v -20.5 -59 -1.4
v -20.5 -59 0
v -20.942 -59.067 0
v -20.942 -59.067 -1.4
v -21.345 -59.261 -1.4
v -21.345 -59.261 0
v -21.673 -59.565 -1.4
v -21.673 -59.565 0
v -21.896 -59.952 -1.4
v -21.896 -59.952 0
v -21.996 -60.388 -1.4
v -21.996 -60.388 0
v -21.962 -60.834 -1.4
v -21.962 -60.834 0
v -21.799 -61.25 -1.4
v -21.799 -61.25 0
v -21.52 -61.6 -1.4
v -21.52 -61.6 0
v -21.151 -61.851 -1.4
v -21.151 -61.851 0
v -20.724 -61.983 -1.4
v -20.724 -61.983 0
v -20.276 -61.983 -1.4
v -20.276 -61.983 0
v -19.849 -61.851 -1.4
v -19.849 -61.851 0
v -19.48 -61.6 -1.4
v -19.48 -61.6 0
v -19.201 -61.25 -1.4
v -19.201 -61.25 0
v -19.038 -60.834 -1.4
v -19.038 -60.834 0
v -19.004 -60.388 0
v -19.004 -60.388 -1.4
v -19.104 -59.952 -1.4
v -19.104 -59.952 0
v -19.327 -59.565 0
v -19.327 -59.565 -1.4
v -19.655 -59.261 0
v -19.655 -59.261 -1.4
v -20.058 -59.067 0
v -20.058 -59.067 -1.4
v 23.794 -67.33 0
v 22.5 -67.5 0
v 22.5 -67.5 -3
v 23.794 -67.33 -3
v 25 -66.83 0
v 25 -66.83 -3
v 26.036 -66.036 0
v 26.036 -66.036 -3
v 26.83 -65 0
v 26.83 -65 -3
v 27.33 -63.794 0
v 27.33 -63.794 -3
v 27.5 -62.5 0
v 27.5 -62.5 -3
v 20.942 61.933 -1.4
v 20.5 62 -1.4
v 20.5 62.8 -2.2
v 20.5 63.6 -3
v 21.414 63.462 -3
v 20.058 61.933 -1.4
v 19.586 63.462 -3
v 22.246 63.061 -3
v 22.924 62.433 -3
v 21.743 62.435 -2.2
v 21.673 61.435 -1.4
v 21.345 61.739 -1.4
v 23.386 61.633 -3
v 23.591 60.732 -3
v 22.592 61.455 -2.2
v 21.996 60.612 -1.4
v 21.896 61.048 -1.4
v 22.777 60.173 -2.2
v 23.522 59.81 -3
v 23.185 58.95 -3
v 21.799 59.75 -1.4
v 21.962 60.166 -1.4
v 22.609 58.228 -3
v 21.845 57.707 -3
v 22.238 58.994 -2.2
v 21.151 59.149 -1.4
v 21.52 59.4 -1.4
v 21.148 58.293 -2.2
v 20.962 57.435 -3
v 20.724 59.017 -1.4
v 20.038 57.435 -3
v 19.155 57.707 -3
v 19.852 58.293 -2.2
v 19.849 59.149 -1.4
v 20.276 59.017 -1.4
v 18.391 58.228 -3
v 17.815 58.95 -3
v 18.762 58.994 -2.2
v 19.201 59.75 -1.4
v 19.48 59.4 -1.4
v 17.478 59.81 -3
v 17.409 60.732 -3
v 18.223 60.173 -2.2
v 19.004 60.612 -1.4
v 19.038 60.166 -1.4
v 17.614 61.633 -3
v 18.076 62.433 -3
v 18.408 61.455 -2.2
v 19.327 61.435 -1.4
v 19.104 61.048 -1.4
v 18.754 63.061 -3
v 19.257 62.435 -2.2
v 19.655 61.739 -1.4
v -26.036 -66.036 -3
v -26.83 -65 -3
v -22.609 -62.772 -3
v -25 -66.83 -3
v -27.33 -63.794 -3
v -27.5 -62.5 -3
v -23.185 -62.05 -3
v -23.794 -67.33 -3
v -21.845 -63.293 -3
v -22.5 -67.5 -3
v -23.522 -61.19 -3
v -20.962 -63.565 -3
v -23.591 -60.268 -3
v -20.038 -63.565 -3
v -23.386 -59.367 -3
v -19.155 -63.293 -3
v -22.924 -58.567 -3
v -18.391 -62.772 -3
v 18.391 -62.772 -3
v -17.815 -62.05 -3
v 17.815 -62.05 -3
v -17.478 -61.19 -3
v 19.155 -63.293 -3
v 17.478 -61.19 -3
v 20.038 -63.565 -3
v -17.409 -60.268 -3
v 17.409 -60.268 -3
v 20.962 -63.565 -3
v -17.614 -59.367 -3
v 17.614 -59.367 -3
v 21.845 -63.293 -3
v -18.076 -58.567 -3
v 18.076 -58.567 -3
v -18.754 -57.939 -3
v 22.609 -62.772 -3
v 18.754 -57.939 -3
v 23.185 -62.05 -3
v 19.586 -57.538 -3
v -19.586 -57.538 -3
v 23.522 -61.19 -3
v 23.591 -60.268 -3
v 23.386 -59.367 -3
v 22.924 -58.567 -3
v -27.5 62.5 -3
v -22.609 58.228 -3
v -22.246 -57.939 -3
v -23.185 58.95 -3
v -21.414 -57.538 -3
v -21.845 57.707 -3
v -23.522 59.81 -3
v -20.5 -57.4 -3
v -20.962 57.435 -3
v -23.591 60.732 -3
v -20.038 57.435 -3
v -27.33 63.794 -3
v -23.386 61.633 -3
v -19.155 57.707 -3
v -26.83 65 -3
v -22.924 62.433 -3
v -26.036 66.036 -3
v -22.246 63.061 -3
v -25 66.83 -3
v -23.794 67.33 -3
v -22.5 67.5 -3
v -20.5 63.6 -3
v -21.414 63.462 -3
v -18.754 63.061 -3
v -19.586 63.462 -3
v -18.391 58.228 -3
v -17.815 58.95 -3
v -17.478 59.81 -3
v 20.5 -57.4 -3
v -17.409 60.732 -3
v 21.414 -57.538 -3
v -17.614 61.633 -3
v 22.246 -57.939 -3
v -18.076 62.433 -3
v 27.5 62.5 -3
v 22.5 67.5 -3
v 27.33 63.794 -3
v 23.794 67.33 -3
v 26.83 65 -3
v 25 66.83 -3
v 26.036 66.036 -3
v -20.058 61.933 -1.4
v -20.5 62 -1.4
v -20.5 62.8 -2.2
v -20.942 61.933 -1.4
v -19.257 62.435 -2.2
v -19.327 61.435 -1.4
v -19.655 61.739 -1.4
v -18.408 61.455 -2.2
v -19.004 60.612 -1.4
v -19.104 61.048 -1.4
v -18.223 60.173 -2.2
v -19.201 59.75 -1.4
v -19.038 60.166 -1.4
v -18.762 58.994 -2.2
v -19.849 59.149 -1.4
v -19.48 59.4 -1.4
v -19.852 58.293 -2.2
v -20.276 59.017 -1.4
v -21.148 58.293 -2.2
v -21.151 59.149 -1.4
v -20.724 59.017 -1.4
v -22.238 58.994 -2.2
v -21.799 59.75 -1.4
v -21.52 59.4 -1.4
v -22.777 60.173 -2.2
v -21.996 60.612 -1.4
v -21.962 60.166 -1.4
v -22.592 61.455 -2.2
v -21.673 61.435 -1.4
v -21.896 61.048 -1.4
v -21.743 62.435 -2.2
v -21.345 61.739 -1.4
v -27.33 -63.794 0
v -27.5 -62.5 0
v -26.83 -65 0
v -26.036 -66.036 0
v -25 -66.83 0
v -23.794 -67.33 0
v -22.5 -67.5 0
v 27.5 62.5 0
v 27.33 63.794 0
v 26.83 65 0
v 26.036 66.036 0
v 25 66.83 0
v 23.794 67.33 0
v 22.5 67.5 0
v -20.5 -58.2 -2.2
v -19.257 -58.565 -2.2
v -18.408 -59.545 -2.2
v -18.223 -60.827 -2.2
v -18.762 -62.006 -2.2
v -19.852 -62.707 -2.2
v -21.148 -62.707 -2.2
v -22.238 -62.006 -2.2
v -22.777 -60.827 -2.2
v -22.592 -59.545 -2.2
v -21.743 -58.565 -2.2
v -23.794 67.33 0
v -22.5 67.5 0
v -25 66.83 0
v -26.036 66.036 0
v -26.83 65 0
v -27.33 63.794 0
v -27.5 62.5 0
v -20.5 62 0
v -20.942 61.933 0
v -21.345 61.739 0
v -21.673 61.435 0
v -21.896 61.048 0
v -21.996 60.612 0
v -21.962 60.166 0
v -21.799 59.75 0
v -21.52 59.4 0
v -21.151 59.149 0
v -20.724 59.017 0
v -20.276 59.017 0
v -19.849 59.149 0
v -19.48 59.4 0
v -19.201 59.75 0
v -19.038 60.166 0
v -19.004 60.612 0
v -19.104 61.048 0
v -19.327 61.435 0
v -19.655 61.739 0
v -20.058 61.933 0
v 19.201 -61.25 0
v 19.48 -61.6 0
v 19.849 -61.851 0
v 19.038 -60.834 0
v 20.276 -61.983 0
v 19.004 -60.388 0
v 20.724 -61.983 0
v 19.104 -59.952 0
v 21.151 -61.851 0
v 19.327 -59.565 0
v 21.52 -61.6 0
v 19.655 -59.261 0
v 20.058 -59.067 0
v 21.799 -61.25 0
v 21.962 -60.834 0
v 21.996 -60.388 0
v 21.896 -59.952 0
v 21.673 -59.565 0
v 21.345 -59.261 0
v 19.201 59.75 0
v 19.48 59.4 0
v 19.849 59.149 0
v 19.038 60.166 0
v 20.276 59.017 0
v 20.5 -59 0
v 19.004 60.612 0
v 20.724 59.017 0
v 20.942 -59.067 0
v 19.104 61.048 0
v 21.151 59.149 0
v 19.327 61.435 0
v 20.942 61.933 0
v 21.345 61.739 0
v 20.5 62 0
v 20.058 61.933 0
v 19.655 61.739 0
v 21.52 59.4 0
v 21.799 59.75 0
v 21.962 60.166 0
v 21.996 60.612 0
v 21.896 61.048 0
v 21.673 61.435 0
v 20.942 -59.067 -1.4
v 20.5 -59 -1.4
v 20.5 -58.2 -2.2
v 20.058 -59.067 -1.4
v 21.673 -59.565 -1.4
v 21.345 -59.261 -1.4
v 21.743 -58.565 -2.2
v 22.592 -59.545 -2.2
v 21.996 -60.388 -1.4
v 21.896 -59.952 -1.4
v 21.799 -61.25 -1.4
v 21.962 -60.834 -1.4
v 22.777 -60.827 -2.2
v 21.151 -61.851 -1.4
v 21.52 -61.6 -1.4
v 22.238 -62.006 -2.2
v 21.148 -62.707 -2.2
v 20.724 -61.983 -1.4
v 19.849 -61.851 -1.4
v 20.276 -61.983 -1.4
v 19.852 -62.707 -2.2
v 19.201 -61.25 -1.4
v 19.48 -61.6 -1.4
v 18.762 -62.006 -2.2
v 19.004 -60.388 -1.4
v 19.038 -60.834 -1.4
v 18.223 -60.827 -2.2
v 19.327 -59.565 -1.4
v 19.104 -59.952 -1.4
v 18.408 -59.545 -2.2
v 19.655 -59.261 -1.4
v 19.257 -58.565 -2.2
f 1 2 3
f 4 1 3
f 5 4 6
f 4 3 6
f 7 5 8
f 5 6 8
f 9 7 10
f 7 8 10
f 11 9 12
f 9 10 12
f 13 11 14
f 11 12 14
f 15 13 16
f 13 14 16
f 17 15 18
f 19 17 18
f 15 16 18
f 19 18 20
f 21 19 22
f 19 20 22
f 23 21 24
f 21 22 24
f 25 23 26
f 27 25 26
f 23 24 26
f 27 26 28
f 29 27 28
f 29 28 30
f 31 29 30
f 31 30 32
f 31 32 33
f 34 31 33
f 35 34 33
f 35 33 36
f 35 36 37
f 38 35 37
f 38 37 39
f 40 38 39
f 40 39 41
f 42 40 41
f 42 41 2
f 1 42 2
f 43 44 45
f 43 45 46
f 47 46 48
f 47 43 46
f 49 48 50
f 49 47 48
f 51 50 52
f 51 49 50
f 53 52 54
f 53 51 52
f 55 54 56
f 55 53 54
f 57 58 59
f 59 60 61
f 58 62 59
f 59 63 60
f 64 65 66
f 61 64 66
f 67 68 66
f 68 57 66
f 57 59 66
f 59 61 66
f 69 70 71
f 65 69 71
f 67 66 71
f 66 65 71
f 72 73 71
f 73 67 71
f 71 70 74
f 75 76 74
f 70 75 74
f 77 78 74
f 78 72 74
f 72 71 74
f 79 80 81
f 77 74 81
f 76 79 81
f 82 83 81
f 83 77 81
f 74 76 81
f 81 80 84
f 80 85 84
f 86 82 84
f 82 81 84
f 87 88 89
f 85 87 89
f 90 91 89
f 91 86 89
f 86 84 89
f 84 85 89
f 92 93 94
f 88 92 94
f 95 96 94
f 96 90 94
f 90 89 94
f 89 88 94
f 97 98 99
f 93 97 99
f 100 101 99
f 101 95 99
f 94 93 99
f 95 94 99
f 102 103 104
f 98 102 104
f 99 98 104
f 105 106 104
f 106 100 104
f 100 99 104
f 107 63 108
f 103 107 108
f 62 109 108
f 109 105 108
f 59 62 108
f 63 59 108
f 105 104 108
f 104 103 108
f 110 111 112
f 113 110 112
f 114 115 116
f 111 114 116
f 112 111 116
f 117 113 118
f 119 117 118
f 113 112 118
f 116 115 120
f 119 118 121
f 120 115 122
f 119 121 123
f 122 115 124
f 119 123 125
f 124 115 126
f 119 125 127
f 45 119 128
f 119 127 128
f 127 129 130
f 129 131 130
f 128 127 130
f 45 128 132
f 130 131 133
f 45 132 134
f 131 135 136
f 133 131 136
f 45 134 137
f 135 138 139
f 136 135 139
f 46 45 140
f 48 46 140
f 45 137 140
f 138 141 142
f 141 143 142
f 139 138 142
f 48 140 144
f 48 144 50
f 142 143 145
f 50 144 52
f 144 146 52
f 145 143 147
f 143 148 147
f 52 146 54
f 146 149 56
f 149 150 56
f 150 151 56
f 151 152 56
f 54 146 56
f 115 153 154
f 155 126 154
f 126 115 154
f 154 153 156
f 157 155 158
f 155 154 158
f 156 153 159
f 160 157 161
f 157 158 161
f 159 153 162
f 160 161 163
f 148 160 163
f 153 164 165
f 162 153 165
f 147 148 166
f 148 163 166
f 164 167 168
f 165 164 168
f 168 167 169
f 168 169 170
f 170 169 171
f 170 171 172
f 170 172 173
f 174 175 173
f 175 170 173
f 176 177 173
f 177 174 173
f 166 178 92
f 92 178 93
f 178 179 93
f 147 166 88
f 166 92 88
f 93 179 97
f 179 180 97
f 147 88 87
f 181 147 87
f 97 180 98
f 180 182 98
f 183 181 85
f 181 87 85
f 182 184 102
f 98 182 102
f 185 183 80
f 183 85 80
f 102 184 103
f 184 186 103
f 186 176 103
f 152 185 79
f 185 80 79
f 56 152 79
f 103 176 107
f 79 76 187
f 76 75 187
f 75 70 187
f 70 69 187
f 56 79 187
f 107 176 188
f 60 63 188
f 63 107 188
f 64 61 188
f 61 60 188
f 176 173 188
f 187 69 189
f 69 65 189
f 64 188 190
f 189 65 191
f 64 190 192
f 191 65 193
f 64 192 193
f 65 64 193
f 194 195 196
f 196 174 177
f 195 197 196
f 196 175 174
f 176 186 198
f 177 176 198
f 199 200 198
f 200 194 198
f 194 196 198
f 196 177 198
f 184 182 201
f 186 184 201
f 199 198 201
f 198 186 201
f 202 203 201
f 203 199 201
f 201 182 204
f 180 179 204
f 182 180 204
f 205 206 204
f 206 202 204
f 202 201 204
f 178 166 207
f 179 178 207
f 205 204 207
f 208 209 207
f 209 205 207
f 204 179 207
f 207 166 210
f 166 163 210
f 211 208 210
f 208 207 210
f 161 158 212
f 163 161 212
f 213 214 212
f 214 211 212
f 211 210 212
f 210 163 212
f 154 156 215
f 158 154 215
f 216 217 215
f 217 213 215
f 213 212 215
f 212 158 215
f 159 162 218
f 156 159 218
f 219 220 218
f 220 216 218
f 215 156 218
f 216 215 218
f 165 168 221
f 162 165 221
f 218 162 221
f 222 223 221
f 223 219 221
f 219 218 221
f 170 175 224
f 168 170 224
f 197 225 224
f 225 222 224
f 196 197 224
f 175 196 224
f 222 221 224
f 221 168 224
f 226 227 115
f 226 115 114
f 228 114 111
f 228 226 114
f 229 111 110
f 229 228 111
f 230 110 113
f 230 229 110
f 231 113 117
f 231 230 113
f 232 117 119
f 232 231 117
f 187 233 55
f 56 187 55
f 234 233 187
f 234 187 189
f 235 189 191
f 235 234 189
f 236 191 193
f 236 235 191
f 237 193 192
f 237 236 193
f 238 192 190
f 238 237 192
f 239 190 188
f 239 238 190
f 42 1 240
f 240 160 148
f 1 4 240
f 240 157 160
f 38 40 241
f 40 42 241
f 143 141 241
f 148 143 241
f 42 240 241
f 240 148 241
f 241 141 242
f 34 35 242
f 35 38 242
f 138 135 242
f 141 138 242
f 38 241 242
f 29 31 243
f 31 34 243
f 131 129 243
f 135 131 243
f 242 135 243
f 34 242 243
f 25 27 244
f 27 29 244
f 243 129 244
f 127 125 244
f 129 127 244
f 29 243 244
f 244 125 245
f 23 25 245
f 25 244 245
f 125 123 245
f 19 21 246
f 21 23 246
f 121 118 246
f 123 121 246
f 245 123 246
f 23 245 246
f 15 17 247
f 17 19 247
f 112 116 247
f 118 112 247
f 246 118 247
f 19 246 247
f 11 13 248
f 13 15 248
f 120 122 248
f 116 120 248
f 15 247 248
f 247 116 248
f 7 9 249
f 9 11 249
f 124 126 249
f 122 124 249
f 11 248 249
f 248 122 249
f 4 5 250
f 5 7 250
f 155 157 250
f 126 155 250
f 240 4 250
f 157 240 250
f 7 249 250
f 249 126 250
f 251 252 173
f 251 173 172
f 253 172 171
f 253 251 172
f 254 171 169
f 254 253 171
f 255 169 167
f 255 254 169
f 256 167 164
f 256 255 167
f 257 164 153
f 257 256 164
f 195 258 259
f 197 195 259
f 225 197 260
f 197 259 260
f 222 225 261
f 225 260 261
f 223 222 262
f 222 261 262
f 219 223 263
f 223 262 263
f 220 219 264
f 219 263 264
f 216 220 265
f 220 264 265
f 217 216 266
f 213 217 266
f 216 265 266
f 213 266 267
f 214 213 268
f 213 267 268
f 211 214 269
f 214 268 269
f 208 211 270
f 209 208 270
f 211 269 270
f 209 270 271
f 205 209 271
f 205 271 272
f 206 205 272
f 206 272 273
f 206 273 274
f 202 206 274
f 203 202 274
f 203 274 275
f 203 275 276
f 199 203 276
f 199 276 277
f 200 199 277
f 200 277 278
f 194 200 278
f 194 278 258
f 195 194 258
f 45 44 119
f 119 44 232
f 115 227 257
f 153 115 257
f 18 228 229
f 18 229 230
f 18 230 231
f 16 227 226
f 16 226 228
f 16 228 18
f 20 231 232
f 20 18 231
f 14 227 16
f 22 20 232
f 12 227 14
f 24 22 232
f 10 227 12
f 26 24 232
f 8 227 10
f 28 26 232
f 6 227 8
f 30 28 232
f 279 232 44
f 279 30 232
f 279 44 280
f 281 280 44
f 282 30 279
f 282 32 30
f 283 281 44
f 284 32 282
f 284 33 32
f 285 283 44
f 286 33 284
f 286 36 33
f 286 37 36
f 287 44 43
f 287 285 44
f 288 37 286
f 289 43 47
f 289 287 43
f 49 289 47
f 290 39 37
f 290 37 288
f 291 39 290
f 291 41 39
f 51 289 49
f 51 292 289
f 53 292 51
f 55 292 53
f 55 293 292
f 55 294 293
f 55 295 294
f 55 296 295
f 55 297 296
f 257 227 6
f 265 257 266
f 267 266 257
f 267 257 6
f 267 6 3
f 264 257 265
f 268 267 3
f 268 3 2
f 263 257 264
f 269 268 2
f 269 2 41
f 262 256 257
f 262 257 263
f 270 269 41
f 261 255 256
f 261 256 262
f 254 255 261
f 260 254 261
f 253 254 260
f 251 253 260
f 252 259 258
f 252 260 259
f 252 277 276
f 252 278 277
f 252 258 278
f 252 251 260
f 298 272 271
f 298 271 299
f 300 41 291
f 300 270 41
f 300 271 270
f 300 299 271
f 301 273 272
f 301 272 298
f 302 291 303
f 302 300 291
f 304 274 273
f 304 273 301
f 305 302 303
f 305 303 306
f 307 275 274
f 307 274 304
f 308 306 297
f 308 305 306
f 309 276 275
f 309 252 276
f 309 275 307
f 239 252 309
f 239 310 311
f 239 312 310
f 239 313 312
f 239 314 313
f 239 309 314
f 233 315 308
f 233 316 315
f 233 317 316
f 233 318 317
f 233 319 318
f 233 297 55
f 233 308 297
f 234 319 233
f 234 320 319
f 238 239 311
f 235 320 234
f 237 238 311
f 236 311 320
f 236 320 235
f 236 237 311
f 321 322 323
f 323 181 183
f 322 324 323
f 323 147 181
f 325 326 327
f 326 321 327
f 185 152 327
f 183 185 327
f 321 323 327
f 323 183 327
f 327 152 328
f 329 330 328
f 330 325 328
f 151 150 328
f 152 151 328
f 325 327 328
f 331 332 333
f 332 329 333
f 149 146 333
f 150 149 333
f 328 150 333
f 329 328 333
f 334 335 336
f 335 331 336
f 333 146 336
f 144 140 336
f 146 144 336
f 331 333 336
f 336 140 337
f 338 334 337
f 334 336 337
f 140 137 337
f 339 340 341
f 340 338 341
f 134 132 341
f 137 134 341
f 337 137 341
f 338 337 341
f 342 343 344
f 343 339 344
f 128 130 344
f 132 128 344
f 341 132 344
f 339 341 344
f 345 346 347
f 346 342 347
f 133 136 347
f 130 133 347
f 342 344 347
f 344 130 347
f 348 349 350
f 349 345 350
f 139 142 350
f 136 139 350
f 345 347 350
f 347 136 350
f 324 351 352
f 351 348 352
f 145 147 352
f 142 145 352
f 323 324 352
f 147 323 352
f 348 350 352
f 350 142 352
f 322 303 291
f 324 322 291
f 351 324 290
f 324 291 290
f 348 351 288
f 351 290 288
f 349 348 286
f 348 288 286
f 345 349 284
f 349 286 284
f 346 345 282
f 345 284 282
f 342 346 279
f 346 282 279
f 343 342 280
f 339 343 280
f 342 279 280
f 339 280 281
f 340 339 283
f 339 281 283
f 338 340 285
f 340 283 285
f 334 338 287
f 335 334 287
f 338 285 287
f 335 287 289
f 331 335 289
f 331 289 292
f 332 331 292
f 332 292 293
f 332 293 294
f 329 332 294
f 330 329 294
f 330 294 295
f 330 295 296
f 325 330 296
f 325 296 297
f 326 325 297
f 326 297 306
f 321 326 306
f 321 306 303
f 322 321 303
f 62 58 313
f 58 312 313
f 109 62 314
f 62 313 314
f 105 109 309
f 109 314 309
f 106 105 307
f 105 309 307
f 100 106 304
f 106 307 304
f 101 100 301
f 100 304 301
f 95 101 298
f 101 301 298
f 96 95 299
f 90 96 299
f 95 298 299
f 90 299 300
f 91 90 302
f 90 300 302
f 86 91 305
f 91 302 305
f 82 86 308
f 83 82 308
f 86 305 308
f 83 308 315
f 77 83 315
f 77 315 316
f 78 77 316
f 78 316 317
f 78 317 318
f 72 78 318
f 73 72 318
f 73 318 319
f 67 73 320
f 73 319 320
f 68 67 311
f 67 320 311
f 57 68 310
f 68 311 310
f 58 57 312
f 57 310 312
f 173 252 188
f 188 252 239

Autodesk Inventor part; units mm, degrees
ref_plane "YZ Plane" through (0, 0, 0) normal (1, 0, 0) x (0, 1, 0)
ref_plane "XZ Plane" through (0, 0, 0) normal (0, 1, 0) x (-1, 0, 0)
ref_plane "XY Plane" through (0, 0, 0) normal (0, 0, 1) x (1, 0, 0)
sketch "Sketch1" plane through (0, 0, 0) normal (0, 0, 1) x (1, 0, 0)
  arc A0 (22.5, -67.5) -> (27.5, -62.5) centre (22.5, -62.5) ccw projected
  line L0 (27.5, 62.5) -> (27.5, -62.5) projected
  arc A1 (27.5, 62.5) -> (22.5, 67.5) centre (22.5, 62.5) ccw projected
  line L1 (-22.5, 67.5) -> (22.5, 67.5) projected
  arc A2 (-22.5, 67.5) -> (-27.5, 62.5) centre (-22.5, 62.5) ccw projected
  line L2 (-27.5, -62.5) -> (-27.5, 62.5) projected
  arc A3 (-27.5, -62.5) -> (-22.5, -67.5) centre (-22.5, -62.5) ccw projected
  line L3 (22.5, -67.5) -> (-22.5, -67.5) projected
  circle A4 centre (20.5, -60.5) radius 1.5 construction
  circle A5 centre (20.5, 60.5) radius 1.5 construction
  circle A6 centre (-20.5, 60.5) radius 1.5 construction
  circle A7 centre (-20.5, -60.5) radius 1.5 construction
extrude "Extrusion1" add sketch "Sketch1" against normal blind 3
sketch "Sketch4" plane through (0, 0, -3) normal (0, 0, -1) x (-1, 0, 0)
  point P0 (0, 0)
  point P1 (20.5, -60.5)
  point P2 (-20.5, -60.5)
  point P3 (20.5, 60.5)
  point P4 (-20.5, 60.5)
hole "Hole1" at (-20.5, -60.5, -3) at (20.5, -60.5, -3) at (-20.5, 60.5, -3) at (20.5, 60.5, -3) direction (0, 0, 1) diameter 3 end through all countersink diameter 6.2 countersink angle 90
equation "\"d3\" = Plate_thickness"
equation "\"Plate_thickness\" = 3"
equation "\"Top_Plate_Bottom_to_PowerPcb_Bottom\" = 2.7"
properties part number "Box_Bottom_Plate" material "Aluminum 6061"
